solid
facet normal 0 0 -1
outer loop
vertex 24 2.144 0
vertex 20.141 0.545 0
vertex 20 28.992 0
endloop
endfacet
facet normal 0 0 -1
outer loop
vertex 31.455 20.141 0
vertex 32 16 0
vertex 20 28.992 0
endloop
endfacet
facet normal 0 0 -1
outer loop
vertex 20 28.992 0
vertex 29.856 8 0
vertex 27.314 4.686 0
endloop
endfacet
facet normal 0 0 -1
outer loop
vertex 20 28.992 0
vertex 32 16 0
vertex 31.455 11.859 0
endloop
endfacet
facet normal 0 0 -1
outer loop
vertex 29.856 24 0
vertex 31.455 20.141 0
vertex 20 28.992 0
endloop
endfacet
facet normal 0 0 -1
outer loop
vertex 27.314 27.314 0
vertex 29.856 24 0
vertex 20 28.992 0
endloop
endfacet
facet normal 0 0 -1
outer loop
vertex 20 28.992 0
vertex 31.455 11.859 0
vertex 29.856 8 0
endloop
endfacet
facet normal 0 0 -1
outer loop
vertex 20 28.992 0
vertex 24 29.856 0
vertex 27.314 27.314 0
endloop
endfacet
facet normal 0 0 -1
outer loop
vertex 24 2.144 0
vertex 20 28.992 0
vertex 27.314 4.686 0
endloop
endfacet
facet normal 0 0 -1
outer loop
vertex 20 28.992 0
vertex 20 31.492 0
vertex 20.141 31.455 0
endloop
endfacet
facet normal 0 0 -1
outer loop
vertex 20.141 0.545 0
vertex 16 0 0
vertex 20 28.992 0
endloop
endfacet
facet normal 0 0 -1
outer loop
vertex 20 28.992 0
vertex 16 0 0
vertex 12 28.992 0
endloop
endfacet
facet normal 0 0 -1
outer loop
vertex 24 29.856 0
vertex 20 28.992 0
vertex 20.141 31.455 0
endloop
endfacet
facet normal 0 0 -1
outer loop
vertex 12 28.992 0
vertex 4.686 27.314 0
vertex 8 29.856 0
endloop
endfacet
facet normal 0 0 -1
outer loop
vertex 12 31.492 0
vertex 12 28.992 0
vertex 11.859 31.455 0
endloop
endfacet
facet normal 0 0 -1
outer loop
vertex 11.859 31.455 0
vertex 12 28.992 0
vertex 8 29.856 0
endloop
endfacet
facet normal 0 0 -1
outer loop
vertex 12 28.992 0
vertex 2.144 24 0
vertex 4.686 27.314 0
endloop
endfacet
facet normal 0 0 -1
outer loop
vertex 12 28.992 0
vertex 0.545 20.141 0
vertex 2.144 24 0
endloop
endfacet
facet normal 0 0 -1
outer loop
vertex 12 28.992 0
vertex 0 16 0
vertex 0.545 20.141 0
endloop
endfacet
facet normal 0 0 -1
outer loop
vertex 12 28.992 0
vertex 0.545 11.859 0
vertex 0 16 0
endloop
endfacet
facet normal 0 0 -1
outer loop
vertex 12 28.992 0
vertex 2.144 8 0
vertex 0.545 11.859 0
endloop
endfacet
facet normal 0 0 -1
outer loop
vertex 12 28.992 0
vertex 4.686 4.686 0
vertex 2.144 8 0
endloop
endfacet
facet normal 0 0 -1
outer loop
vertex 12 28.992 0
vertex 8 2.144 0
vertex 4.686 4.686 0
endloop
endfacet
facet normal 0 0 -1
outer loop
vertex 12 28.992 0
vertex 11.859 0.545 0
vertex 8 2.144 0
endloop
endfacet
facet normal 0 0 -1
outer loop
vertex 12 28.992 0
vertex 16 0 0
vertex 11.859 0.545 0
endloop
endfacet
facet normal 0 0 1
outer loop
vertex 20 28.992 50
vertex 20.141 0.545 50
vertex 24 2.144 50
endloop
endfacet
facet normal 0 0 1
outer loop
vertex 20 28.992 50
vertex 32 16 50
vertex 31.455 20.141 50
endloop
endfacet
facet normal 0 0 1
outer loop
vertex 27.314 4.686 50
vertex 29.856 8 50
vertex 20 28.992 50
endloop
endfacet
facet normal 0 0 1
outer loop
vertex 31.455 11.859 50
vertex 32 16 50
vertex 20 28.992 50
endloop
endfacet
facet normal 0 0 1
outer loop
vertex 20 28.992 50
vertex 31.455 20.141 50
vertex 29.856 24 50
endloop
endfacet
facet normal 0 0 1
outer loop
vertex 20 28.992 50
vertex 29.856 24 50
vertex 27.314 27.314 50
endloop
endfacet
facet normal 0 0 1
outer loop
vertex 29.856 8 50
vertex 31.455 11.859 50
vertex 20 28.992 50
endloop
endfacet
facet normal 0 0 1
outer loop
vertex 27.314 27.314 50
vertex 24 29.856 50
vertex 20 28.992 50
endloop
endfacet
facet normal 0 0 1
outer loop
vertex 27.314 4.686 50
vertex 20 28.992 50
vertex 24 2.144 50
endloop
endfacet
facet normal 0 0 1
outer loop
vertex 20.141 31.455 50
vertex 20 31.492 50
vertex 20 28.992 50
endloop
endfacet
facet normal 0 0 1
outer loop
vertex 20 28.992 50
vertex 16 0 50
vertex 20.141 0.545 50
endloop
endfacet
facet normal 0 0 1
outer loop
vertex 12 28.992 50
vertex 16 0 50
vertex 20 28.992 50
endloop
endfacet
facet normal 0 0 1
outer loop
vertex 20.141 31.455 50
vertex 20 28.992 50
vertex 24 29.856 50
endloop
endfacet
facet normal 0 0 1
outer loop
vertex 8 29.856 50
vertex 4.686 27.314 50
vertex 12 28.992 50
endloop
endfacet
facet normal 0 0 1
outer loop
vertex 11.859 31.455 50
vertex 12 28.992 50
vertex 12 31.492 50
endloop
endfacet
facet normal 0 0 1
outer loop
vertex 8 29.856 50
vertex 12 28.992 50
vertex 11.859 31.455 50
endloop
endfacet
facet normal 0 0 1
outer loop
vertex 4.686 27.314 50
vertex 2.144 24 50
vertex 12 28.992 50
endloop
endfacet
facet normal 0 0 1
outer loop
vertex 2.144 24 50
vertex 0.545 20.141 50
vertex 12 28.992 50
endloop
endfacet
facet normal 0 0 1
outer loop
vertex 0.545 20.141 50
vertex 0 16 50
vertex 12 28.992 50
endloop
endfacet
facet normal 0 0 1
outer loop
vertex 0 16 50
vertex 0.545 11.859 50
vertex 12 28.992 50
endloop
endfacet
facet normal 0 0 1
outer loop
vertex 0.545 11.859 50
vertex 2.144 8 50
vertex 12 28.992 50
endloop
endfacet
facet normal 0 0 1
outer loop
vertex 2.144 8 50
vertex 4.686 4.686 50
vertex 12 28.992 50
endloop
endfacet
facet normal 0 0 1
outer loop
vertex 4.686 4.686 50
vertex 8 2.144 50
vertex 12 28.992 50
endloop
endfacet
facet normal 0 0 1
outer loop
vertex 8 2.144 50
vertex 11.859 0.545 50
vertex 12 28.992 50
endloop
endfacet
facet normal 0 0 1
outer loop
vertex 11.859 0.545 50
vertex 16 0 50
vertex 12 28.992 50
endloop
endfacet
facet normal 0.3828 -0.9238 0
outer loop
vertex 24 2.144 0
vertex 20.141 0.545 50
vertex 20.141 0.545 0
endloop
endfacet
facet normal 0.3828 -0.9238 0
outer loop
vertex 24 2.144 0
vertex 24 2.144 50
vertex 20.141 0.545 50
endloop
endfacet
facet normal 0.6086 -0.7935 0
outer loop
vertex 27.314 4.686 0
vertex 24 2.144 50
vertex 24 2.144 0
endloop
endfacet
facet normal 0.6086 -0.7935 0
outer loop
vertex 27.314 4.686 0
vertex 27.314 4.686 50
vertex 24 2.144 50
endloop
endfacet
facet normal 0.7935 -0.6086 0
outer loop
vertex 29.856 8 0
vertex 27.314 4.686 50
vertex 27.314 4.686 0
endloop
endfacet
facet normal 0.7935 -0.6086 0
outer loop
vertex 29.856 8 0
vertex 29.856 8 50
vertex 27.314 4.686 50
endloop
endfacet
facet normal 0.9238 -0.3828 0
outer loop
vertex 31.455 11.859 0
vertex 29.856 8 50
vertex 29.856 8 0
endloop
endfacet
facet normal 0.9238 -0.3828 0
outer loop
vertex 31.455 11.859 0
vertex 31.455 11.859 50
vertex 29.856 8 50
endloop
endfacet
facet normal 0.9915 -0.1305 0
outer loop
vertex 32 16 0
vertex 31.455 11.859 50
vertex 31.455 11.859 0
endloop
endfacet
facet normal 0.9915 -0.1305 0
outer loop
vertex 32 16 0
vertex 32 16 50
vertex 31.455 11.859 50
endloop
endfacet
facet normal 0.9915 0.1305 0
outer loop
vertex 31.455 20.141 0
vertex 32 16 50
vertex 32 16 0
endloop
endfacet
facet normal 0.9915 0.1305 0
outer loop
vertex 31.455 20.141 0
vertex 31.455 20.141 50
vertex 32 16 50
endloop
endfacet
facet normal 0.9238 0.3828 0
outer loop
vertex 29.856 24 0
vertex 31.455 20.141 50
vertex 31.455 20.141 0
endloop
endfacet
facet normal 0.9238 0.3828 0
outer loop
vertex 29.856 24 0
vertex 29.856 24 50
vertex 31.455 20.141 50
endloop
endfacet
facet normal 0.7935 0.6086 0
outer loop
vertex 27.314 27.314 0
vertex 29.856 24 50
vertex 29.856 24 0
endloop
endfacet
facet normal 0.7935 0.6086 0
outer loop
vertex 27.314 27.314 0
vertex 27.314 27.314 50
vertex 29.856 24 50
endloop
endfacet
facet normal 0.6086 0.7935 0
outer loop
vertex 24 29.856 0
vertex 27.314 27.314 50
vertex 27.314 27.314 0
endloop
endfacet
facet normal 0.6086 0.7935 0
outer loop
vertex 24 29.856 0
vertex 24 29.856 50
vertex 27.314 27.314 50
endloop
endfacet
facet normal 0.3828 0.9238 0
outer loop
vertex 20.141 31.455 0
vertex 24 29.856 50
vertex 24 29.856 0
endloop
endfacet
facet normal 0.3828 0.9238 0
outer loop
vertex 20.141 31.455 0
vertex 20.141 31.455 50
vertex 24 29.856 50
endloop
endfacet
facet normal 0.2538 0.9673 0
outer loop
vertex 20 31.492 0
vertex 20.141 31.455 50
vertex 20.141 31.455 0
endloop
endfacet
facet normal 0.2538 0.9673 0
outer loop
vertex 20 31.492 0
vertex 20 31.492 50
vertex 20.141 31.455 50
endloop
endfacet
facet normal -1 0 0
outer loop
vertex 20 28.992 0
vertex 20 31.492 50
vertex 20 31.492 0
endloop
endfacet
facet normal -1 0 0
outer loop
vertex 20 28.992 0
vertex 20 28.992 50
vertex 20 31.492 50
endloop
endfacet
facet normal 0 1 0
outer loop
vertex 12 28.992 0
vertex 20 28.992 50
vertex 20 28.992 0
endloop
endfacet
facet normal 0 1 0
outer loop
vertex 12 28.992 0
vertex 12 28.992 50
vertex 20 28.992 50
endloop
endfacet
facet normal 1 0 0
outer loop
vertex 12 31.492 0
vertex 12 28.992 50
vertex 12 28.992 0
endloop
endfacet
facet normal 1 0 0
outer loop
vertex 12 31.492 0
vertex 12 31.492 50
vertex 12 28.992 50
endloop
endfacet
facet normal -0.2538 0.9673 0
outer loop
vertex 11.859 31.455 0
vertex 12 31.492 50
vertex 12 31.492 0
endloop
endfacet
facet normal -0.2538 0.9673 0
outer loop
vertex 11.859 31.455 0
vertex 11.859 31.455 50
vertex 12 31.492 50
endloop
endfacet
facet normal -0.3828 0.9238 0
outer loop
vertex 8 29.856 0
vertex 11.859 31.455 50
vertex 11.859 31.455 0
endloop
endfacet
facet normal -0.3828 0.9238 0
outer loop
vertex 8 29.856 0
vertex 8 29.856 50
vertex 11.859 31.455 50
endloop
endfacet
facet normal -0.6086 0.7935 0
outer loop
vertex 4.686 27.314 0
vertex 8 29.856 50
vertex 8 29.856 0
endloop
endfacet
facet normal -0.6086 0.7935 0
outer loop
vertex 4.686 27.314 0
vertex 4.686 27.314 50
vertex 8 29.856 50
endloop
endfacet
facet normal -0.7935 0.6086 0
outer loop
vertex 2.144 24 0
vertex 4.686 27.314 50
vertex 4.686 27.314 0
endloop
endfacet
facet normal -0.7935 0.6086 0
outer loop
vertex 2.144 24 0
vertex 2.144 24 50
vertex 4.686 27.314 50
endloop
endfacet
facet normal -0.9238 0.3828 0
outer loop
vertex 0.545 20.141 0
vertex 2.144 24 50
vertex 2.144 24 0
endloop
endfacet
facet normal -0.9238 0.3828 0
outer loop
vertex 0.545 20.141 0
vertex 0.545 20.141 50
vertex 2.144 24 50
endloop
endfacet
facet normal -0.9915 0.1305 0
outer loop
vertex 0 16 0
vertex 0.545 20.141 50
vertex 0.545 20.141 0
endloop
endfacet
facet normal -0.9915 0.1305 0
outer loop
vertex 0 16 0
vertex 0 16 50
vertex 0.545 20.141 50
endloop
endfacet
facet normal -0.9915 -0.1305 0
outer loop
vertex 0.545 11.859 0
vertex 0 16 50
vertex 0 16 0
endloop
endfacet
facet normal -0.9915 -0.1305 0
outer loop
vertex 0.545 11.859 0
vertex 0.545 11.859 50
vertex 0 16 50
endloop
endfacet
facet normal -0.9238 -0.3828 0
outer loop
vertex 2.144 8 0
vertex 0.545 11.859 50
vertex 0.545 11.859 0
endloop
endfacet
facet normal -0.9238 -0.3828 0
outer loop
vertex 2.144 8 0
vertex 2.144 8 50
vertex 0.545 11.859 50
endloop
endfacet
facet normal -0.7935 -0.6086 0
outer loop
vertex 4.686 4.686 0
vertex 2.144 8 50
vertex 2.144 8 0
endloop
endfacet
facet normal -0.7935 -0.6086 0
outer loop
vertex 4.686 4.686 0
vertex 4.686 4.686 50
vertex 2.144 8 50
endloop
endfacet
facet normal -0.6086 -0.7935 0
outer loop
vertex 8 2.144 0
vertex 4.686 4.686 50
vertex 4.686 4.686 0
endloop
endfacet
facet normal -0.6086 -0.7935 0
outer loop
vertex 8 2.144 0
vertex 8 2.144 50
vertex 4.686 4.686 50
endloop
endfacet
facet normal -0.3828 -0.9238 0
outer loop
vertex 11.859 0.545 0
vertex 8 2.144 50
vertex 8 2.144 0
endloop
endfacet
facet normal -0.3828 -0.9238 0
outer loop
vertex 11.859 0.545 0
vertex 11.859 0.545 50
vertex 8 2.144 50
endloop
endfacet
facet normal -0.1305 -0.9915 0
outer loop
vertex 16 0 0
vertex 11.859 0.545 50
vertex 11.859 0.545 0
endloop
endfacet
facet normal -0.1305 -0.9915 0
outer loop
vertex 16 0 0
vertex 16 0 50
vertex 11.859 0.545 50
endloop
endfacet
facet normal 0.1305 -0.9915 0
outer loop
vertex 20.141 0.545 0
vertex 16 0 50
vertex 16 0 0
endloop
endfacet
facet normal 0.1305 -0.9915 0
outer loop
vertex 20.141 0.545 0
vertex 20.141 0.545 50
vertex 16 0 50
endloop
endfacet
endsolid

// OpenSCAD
$fn = 32;

// ----------------------------------------------------------------------
// Keyway shaft: d32 shaft, key 8 x 2.5 mm
// ----------------------------------------------------------------------

// --- parameters (mm) ---
shaft_r = 16;             // shaft radius
key_w = 8;                // keyway width
key_d = 2.5;              // keyway depth below the surface line
plate_t = 50;             // shaft length, Z (extrusion height)

shaft_d = 2 * shaft_r;  // shaft diameter
circle_step = 15;  // polygon sampling step, degrees

profile = [[11.859, 31.455], [8, 29.856], [4.686, 27.314], [2.144, 24], [0.545, 20.141], [0, 16], [0.545, 11.859], [2.144, 8], [4.686, 4.686], [8, 2.144], [11.859, 0.545], [16, 0], [20.141, 0.545], [24, 2.144], [27.314, 4.686], [29.856, 8], [31.455, 11.859], [32, 16], [31.455, 20.141], [29.856, 24], [27.314, 27.314], [24, 29.856], [20.141, 31.455], [20, 31.492], [20, 28.992], [12, 28.992], [12, 31.492]];  // primary outline, 27 points, counter clockwise

// --- the one profile operation ---
linear_extrude(height = plate_t) polygon(points = profile);
